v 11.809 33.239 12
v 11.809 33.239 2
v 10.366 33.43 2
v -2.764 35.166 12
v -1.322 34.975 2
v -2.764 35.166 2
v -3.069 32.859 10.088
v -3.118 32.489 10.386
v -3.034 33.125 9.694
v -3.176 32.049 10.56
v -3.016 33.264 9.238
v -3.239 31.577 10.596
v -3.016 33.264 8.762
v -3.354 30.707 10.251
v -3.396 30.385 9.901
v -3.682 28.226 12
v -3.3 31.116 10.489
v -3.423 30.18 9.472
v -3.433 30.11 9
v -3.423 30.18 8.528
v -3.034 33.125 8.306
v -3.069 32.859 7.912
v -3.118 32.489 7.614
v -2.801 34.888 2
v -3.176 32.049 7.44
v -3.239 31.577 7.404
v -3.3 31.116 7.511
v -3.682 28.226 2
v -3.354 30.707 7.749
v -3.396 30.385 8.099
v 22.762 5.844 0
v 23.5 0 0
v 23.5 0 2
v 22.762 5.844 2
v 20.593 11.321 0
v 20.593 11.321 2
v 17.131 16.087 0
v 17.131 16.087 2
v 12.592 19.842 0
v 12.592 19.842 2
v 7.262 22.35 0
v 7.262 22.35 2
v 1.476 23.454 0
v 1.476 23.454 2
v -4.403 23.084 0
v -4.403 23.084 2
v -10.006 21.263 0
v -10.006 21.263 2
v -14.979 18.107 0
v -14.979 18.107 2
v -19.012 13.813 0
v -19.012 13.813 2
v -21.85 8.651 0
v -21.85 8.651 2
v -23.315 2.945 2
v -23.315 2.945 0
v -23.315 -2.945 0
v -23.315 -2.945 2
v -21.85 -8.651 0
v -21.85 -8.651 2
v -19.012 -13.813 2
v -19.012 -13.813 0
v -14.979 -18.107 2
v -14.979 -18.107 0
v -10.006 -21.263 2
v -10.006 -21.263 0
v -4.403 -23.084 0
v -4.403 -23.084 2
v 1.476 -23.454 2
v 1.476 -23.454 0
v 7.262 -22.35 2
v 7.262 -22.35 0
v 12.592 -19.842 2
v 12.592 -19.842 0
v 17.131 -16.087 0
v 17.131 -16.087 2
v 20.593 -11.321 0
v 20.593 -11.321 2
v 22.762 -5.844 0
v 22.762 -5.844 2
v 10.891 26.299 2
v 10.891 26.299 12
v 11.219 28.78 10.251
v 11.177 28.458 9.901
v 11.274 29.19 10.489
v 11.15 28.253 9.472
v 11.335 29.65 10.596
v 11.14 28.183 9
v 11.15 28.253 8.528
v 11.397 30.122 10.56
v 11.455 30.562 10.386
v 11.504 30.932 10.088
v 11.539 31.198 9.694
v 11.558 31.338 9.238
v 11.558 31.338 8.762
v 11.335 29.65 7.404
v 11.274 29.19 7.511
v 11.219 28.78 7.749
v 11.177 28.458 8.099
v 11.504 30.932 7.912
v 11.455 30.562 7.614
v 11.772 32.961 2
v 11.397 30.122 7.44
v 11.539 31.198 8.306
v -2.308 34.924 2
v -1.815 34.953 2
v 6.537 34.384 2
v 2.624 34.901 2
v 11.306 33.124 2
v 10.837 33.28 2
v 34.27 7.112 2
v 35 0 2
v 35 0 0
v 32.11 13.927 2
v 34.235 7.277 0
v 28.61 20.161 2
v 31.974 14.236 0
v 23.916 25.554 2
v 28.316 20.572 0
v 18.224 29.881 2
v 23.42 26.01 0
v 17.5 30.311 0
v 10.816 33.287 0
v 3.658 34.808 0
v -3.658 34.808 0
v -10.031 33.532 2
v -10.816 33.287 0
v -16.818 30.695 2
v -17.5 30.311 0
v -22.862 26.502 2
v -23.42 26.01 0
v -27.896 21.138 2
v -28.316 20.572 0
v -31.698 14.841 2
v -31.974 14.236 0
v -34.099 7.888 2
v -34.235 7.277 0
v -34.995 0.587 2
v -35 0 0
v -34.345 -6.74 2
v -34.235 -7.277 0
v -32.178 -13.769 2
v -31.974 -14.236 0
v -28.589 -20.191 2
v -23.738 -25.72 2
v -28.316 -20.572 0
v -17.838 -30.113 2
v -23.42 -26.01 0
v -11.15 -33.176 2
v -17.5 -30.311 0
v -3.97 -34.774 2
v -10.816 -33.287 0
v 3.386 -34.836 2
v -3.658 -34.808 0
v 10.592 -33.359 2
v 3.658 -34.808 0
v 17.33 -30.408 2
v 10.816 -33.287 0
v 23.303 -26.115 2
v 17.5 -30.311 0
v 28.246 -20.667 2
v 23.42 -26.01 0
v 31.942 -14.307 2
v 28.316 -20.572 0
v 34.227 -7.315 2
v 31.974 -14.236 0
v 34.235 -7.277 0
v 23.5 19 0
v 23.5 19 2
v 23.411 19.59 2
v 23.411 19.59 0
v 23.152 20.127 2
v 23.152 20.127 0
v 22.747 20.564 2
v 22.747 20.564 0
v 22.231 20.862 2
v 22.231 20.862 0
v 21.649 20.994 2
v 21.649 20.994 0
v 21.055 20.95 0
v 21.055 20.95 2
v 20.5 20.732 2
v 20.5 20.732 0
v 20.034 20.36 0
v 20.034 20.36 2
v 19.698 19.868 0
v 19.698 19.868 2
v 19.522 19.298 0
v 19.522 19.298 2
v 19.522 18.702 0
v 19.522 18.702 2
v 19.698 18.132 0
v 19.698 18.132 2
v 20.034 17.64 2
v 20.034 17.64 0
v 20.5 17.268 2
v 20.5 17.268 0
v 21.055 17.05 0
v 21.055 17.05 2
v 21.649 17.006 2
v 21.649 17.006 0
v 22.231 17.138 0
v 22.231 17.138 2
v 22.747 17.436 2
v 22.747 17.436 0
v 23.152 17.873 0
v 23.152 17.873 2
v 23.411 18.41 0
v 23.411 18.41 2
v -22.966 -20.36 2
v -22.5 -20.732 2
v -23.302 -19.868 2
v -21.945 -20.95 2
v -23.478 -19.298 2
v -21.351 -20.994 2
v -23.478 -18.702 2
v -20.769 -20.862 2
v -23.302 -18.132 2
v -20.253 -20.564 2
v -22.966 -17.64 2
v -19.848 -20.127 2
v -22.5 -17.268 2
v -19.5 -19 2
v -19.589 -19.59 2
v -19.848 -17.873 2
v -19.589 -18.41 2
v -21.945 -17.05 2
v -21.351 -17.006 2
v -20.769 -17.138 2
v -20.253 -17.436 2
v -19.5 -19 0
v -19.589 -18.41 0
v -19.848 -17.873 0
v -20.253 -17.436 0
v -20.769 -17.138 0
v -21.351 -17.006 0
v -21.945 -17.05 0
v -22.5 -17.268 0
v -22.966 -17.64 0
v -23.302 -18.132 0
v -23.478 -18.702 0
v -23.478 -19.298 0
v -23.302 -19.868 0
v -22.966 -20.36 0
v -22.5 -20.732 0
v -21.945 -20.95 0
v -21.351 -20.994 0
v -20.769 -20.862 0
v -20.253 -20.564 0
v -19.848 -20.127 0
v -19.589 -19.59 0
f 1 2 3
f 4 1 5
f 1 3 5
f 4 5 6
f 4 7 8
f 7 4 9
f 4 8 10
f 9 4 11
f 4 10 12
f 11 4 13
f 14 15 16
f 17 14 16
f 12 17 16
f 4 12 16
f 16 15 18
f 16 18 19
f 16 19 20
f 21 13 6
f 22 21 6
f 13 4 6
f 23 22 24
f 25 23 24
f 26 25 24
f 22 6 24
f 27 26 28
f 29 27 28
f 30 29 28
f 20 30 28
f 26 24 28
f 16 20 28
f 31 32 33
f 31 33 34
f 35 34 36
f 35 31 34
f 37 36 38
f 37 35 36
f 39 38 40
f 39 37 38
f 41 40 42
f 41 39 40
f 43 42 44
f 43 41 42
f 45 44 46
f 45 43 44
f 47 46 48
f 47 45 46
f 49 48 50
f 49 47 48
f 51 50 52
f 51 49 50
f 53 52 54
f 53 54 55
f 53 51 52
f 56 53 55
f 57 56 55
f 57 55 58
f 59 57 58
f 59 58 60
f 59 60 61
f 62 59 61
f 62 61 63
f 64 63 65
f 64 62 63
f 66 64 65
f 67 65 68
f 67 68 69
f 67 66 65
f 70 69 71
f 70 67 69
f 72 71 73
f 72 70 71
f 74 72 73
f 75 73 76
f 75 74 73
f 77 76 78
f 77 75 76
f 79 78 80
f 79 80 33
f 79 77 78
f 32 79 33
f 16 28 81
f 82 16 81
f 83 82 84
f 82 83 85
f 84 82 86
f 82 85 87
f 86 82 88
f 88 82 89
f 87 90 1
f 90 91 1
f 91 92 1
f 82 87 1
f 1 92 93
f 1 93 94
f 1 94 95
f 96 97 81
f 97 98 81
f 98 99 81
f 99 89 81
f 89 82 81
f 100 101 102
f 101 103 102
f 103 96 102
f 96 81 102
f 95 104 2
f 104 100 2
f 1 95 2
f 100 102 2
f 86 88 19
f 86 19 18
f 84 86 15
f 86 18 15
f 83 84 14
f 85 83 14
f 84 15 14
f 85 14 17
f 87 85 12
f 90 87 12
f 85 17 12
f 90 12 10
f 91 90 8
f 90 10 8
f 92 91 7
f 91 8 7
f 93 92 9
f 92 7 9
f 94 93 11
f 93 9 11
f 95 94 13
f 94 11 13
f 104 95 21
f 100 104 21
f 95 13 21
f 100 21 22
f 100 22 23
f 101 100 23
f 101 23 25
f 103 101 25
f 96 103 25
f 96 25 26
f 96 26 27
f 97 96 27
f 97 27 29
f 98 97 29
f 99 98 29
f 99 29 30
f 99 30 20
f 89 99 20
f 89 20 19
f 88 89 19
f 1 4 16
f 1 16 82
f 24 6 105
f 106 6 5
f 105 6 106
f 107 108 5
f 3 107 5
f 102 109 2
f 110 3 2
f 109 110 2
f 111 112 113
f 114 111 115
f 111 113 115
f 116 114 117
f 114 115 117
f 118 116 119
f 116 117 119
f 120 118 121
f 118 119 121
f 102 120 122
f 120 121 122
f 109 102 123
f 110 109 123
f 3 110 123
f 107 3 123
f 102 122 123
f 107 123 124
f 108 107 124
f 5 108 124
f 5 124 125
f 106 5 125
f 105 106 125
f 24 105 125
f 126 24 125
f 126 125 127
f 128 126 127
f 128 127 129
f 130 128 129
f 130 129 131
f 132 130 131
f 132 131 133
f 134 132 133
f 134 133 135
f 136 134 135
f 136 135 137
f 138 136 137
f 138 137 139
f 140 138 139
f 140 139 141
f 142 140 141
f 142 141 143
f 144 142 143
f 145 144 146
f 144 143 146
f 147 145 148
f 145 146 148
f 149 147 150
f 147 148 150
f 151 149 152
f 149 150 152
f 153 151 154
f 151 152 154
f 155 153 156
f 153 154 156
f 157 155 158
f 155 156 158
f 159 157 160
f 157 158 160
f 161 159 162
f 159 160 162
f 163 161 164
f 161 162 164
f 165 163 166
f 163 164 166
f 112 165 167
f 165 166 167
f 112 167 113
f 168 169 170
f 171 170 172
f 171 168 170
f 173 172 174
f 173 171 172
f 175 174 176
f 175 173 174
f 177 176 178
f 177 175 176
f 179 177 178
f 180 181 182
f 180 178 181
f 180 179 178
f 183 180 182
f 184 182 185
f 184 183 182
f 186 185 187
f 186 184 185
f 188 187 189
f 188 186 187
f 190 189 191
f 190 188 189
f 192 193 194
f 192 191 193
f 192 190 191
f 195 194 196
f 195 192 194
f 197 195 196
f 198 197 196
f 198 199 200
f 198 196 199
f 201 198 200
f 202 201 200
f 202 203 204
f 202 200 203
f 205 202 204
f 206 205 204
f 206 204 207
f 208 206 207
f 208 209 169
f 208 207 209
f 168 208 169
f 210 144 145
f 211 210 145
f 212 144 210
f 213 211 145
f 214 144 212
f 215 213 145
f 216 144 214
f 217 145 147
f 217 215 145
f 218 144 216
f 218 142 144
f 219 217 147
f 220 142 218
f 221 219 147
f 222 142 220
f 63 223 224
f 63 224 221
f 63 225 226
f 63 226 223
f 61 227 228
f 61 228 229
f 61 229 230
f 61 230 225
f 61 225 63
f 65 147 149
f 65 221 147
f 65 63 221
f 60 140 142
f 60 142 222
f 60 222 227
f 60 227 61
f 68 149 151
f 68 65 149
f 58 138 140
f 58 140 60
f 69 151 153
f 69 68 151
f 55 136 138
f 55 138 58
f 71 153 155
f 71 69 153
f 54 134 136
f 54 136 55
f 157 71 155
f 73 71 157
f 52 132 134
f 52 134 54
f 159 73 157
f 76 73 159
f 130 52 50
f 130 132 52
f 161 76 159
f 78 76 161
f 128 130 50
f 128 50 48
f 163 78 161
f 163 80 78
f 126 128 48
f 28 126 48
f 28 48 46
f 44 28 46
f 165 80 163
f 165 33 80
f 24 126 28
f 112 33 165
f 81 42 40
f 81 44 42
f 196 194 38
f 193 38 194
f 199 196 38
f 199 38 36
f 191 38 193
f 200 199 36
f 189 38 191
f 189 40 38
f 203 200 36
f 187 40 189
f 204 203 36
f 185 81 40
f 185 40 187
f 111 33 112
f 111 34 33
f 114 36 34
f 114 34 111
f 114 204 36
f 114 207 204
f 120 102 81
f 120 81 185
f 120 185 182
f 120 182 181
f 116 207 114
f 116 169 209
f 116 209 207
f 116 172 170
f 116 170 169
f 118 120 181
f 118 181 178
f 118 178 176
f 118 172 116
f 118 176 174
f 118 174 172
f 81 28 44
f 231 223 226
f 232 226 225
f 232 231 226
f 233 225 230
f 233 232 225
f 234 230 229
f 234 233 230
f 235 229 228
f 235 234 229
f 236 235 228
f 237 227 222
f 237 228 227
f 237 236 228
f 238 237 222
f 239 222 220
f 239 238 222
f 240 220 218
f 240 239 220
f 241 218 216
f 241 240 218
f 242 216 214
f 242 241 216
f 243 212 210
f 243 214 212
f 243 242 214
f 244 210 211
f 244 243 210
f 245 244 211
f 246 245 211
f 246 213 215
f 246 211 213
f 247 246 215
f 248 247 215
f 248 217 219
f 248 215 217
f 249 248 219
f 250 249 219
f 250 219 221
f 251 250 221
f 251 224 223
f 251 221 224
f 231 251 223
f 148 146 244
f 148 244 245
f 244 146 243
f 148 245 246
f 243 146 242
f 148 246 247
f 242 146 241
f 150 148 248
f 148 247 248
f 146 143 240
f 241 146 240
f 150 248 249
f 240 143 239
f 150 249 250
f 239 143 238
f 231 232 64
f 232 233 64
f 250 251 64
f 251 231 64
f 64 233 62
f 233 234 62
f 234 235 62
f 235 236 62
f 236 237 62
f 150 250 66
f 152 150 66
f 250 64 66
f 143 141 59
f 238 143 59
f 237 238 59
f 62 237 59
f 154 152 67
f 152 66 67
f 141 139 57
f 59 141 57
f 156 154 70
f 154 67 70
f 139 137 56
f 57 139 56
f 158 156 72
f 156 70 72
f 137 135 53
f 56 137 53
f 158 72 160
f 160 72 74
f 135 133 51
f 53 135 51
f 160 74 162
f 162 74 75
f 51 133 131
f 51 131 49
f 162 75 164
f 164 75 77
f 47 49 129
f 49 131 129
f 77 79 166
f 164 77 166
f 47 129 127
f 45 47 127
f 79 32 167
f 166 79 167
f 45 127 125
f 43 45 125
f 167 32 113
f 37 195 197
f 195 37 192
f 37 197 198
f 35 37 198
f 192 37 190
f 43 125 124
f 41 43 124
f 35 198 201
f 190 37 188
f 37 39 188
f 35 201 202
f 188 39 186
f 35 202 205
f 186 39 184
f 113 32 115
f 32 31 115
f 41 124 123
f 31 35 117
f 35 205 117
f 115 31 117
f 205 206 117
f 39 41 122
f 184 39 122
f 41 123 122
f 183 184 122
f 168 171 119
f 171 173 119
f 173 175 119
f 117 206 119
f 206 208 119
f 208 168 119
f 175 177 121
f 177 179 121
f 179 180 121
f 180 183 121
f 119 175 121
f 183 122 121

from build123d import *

# Parameters (mm, degrees)
F0_R     = 35
F0_R_2   = 23.5
F1_DEPTH = 2
F2_R     = 2
F3_DEPTH = 2.001
F5_DEPTH = 10
F6_R     = 1.6
F7_DEPTH = 46.636965


with BuildPart() as f1:
    # F0 (on Top) → F1 (new body)
    with BuildSketch(Plane.XY):
        Circle(F0_R)
        Circle(F0_R_2, mode=Mode.SUBTRACT)
    extrude(amount=F1_DEPTH)

    # F2 (on Top) → F3 (cut, through all)
    with BuildSketch(Plane.XY):
        with Locations((-21.5, -19)):
            Circle(F2_R)
        with Locations((21.5, 19)):
            Circle(F2_R)
    extrude(amount=F3_DEPTH, mode=Mode.SUBTRACT)

    # F4 (on face) → F5 (join)
    with BuildSketch(Plane.XY.offset(2)):
        Polygon((11.80901, 33.238829), (-2.764145, 35.165779), (-3.68174, 28.226181), (10.891415, 26.299231), align=None)
    extrude(amount=F5_DEPTH)

    # F6 (on face) → F7 (cut, through all)
    with BuildSketch(Plane(origin=(-7.286578, 0.963475, 0), x_dir=(-0.131085, -0.991371, 0), z_dir=(-0.991371, 0.131085, 0))):
        with Locations((-31, 9)):
            Circle(F6_R)
    extrude(amount=-F7_DEPTH, mode=Mode.SUBTRACT)


solid = f1.part
